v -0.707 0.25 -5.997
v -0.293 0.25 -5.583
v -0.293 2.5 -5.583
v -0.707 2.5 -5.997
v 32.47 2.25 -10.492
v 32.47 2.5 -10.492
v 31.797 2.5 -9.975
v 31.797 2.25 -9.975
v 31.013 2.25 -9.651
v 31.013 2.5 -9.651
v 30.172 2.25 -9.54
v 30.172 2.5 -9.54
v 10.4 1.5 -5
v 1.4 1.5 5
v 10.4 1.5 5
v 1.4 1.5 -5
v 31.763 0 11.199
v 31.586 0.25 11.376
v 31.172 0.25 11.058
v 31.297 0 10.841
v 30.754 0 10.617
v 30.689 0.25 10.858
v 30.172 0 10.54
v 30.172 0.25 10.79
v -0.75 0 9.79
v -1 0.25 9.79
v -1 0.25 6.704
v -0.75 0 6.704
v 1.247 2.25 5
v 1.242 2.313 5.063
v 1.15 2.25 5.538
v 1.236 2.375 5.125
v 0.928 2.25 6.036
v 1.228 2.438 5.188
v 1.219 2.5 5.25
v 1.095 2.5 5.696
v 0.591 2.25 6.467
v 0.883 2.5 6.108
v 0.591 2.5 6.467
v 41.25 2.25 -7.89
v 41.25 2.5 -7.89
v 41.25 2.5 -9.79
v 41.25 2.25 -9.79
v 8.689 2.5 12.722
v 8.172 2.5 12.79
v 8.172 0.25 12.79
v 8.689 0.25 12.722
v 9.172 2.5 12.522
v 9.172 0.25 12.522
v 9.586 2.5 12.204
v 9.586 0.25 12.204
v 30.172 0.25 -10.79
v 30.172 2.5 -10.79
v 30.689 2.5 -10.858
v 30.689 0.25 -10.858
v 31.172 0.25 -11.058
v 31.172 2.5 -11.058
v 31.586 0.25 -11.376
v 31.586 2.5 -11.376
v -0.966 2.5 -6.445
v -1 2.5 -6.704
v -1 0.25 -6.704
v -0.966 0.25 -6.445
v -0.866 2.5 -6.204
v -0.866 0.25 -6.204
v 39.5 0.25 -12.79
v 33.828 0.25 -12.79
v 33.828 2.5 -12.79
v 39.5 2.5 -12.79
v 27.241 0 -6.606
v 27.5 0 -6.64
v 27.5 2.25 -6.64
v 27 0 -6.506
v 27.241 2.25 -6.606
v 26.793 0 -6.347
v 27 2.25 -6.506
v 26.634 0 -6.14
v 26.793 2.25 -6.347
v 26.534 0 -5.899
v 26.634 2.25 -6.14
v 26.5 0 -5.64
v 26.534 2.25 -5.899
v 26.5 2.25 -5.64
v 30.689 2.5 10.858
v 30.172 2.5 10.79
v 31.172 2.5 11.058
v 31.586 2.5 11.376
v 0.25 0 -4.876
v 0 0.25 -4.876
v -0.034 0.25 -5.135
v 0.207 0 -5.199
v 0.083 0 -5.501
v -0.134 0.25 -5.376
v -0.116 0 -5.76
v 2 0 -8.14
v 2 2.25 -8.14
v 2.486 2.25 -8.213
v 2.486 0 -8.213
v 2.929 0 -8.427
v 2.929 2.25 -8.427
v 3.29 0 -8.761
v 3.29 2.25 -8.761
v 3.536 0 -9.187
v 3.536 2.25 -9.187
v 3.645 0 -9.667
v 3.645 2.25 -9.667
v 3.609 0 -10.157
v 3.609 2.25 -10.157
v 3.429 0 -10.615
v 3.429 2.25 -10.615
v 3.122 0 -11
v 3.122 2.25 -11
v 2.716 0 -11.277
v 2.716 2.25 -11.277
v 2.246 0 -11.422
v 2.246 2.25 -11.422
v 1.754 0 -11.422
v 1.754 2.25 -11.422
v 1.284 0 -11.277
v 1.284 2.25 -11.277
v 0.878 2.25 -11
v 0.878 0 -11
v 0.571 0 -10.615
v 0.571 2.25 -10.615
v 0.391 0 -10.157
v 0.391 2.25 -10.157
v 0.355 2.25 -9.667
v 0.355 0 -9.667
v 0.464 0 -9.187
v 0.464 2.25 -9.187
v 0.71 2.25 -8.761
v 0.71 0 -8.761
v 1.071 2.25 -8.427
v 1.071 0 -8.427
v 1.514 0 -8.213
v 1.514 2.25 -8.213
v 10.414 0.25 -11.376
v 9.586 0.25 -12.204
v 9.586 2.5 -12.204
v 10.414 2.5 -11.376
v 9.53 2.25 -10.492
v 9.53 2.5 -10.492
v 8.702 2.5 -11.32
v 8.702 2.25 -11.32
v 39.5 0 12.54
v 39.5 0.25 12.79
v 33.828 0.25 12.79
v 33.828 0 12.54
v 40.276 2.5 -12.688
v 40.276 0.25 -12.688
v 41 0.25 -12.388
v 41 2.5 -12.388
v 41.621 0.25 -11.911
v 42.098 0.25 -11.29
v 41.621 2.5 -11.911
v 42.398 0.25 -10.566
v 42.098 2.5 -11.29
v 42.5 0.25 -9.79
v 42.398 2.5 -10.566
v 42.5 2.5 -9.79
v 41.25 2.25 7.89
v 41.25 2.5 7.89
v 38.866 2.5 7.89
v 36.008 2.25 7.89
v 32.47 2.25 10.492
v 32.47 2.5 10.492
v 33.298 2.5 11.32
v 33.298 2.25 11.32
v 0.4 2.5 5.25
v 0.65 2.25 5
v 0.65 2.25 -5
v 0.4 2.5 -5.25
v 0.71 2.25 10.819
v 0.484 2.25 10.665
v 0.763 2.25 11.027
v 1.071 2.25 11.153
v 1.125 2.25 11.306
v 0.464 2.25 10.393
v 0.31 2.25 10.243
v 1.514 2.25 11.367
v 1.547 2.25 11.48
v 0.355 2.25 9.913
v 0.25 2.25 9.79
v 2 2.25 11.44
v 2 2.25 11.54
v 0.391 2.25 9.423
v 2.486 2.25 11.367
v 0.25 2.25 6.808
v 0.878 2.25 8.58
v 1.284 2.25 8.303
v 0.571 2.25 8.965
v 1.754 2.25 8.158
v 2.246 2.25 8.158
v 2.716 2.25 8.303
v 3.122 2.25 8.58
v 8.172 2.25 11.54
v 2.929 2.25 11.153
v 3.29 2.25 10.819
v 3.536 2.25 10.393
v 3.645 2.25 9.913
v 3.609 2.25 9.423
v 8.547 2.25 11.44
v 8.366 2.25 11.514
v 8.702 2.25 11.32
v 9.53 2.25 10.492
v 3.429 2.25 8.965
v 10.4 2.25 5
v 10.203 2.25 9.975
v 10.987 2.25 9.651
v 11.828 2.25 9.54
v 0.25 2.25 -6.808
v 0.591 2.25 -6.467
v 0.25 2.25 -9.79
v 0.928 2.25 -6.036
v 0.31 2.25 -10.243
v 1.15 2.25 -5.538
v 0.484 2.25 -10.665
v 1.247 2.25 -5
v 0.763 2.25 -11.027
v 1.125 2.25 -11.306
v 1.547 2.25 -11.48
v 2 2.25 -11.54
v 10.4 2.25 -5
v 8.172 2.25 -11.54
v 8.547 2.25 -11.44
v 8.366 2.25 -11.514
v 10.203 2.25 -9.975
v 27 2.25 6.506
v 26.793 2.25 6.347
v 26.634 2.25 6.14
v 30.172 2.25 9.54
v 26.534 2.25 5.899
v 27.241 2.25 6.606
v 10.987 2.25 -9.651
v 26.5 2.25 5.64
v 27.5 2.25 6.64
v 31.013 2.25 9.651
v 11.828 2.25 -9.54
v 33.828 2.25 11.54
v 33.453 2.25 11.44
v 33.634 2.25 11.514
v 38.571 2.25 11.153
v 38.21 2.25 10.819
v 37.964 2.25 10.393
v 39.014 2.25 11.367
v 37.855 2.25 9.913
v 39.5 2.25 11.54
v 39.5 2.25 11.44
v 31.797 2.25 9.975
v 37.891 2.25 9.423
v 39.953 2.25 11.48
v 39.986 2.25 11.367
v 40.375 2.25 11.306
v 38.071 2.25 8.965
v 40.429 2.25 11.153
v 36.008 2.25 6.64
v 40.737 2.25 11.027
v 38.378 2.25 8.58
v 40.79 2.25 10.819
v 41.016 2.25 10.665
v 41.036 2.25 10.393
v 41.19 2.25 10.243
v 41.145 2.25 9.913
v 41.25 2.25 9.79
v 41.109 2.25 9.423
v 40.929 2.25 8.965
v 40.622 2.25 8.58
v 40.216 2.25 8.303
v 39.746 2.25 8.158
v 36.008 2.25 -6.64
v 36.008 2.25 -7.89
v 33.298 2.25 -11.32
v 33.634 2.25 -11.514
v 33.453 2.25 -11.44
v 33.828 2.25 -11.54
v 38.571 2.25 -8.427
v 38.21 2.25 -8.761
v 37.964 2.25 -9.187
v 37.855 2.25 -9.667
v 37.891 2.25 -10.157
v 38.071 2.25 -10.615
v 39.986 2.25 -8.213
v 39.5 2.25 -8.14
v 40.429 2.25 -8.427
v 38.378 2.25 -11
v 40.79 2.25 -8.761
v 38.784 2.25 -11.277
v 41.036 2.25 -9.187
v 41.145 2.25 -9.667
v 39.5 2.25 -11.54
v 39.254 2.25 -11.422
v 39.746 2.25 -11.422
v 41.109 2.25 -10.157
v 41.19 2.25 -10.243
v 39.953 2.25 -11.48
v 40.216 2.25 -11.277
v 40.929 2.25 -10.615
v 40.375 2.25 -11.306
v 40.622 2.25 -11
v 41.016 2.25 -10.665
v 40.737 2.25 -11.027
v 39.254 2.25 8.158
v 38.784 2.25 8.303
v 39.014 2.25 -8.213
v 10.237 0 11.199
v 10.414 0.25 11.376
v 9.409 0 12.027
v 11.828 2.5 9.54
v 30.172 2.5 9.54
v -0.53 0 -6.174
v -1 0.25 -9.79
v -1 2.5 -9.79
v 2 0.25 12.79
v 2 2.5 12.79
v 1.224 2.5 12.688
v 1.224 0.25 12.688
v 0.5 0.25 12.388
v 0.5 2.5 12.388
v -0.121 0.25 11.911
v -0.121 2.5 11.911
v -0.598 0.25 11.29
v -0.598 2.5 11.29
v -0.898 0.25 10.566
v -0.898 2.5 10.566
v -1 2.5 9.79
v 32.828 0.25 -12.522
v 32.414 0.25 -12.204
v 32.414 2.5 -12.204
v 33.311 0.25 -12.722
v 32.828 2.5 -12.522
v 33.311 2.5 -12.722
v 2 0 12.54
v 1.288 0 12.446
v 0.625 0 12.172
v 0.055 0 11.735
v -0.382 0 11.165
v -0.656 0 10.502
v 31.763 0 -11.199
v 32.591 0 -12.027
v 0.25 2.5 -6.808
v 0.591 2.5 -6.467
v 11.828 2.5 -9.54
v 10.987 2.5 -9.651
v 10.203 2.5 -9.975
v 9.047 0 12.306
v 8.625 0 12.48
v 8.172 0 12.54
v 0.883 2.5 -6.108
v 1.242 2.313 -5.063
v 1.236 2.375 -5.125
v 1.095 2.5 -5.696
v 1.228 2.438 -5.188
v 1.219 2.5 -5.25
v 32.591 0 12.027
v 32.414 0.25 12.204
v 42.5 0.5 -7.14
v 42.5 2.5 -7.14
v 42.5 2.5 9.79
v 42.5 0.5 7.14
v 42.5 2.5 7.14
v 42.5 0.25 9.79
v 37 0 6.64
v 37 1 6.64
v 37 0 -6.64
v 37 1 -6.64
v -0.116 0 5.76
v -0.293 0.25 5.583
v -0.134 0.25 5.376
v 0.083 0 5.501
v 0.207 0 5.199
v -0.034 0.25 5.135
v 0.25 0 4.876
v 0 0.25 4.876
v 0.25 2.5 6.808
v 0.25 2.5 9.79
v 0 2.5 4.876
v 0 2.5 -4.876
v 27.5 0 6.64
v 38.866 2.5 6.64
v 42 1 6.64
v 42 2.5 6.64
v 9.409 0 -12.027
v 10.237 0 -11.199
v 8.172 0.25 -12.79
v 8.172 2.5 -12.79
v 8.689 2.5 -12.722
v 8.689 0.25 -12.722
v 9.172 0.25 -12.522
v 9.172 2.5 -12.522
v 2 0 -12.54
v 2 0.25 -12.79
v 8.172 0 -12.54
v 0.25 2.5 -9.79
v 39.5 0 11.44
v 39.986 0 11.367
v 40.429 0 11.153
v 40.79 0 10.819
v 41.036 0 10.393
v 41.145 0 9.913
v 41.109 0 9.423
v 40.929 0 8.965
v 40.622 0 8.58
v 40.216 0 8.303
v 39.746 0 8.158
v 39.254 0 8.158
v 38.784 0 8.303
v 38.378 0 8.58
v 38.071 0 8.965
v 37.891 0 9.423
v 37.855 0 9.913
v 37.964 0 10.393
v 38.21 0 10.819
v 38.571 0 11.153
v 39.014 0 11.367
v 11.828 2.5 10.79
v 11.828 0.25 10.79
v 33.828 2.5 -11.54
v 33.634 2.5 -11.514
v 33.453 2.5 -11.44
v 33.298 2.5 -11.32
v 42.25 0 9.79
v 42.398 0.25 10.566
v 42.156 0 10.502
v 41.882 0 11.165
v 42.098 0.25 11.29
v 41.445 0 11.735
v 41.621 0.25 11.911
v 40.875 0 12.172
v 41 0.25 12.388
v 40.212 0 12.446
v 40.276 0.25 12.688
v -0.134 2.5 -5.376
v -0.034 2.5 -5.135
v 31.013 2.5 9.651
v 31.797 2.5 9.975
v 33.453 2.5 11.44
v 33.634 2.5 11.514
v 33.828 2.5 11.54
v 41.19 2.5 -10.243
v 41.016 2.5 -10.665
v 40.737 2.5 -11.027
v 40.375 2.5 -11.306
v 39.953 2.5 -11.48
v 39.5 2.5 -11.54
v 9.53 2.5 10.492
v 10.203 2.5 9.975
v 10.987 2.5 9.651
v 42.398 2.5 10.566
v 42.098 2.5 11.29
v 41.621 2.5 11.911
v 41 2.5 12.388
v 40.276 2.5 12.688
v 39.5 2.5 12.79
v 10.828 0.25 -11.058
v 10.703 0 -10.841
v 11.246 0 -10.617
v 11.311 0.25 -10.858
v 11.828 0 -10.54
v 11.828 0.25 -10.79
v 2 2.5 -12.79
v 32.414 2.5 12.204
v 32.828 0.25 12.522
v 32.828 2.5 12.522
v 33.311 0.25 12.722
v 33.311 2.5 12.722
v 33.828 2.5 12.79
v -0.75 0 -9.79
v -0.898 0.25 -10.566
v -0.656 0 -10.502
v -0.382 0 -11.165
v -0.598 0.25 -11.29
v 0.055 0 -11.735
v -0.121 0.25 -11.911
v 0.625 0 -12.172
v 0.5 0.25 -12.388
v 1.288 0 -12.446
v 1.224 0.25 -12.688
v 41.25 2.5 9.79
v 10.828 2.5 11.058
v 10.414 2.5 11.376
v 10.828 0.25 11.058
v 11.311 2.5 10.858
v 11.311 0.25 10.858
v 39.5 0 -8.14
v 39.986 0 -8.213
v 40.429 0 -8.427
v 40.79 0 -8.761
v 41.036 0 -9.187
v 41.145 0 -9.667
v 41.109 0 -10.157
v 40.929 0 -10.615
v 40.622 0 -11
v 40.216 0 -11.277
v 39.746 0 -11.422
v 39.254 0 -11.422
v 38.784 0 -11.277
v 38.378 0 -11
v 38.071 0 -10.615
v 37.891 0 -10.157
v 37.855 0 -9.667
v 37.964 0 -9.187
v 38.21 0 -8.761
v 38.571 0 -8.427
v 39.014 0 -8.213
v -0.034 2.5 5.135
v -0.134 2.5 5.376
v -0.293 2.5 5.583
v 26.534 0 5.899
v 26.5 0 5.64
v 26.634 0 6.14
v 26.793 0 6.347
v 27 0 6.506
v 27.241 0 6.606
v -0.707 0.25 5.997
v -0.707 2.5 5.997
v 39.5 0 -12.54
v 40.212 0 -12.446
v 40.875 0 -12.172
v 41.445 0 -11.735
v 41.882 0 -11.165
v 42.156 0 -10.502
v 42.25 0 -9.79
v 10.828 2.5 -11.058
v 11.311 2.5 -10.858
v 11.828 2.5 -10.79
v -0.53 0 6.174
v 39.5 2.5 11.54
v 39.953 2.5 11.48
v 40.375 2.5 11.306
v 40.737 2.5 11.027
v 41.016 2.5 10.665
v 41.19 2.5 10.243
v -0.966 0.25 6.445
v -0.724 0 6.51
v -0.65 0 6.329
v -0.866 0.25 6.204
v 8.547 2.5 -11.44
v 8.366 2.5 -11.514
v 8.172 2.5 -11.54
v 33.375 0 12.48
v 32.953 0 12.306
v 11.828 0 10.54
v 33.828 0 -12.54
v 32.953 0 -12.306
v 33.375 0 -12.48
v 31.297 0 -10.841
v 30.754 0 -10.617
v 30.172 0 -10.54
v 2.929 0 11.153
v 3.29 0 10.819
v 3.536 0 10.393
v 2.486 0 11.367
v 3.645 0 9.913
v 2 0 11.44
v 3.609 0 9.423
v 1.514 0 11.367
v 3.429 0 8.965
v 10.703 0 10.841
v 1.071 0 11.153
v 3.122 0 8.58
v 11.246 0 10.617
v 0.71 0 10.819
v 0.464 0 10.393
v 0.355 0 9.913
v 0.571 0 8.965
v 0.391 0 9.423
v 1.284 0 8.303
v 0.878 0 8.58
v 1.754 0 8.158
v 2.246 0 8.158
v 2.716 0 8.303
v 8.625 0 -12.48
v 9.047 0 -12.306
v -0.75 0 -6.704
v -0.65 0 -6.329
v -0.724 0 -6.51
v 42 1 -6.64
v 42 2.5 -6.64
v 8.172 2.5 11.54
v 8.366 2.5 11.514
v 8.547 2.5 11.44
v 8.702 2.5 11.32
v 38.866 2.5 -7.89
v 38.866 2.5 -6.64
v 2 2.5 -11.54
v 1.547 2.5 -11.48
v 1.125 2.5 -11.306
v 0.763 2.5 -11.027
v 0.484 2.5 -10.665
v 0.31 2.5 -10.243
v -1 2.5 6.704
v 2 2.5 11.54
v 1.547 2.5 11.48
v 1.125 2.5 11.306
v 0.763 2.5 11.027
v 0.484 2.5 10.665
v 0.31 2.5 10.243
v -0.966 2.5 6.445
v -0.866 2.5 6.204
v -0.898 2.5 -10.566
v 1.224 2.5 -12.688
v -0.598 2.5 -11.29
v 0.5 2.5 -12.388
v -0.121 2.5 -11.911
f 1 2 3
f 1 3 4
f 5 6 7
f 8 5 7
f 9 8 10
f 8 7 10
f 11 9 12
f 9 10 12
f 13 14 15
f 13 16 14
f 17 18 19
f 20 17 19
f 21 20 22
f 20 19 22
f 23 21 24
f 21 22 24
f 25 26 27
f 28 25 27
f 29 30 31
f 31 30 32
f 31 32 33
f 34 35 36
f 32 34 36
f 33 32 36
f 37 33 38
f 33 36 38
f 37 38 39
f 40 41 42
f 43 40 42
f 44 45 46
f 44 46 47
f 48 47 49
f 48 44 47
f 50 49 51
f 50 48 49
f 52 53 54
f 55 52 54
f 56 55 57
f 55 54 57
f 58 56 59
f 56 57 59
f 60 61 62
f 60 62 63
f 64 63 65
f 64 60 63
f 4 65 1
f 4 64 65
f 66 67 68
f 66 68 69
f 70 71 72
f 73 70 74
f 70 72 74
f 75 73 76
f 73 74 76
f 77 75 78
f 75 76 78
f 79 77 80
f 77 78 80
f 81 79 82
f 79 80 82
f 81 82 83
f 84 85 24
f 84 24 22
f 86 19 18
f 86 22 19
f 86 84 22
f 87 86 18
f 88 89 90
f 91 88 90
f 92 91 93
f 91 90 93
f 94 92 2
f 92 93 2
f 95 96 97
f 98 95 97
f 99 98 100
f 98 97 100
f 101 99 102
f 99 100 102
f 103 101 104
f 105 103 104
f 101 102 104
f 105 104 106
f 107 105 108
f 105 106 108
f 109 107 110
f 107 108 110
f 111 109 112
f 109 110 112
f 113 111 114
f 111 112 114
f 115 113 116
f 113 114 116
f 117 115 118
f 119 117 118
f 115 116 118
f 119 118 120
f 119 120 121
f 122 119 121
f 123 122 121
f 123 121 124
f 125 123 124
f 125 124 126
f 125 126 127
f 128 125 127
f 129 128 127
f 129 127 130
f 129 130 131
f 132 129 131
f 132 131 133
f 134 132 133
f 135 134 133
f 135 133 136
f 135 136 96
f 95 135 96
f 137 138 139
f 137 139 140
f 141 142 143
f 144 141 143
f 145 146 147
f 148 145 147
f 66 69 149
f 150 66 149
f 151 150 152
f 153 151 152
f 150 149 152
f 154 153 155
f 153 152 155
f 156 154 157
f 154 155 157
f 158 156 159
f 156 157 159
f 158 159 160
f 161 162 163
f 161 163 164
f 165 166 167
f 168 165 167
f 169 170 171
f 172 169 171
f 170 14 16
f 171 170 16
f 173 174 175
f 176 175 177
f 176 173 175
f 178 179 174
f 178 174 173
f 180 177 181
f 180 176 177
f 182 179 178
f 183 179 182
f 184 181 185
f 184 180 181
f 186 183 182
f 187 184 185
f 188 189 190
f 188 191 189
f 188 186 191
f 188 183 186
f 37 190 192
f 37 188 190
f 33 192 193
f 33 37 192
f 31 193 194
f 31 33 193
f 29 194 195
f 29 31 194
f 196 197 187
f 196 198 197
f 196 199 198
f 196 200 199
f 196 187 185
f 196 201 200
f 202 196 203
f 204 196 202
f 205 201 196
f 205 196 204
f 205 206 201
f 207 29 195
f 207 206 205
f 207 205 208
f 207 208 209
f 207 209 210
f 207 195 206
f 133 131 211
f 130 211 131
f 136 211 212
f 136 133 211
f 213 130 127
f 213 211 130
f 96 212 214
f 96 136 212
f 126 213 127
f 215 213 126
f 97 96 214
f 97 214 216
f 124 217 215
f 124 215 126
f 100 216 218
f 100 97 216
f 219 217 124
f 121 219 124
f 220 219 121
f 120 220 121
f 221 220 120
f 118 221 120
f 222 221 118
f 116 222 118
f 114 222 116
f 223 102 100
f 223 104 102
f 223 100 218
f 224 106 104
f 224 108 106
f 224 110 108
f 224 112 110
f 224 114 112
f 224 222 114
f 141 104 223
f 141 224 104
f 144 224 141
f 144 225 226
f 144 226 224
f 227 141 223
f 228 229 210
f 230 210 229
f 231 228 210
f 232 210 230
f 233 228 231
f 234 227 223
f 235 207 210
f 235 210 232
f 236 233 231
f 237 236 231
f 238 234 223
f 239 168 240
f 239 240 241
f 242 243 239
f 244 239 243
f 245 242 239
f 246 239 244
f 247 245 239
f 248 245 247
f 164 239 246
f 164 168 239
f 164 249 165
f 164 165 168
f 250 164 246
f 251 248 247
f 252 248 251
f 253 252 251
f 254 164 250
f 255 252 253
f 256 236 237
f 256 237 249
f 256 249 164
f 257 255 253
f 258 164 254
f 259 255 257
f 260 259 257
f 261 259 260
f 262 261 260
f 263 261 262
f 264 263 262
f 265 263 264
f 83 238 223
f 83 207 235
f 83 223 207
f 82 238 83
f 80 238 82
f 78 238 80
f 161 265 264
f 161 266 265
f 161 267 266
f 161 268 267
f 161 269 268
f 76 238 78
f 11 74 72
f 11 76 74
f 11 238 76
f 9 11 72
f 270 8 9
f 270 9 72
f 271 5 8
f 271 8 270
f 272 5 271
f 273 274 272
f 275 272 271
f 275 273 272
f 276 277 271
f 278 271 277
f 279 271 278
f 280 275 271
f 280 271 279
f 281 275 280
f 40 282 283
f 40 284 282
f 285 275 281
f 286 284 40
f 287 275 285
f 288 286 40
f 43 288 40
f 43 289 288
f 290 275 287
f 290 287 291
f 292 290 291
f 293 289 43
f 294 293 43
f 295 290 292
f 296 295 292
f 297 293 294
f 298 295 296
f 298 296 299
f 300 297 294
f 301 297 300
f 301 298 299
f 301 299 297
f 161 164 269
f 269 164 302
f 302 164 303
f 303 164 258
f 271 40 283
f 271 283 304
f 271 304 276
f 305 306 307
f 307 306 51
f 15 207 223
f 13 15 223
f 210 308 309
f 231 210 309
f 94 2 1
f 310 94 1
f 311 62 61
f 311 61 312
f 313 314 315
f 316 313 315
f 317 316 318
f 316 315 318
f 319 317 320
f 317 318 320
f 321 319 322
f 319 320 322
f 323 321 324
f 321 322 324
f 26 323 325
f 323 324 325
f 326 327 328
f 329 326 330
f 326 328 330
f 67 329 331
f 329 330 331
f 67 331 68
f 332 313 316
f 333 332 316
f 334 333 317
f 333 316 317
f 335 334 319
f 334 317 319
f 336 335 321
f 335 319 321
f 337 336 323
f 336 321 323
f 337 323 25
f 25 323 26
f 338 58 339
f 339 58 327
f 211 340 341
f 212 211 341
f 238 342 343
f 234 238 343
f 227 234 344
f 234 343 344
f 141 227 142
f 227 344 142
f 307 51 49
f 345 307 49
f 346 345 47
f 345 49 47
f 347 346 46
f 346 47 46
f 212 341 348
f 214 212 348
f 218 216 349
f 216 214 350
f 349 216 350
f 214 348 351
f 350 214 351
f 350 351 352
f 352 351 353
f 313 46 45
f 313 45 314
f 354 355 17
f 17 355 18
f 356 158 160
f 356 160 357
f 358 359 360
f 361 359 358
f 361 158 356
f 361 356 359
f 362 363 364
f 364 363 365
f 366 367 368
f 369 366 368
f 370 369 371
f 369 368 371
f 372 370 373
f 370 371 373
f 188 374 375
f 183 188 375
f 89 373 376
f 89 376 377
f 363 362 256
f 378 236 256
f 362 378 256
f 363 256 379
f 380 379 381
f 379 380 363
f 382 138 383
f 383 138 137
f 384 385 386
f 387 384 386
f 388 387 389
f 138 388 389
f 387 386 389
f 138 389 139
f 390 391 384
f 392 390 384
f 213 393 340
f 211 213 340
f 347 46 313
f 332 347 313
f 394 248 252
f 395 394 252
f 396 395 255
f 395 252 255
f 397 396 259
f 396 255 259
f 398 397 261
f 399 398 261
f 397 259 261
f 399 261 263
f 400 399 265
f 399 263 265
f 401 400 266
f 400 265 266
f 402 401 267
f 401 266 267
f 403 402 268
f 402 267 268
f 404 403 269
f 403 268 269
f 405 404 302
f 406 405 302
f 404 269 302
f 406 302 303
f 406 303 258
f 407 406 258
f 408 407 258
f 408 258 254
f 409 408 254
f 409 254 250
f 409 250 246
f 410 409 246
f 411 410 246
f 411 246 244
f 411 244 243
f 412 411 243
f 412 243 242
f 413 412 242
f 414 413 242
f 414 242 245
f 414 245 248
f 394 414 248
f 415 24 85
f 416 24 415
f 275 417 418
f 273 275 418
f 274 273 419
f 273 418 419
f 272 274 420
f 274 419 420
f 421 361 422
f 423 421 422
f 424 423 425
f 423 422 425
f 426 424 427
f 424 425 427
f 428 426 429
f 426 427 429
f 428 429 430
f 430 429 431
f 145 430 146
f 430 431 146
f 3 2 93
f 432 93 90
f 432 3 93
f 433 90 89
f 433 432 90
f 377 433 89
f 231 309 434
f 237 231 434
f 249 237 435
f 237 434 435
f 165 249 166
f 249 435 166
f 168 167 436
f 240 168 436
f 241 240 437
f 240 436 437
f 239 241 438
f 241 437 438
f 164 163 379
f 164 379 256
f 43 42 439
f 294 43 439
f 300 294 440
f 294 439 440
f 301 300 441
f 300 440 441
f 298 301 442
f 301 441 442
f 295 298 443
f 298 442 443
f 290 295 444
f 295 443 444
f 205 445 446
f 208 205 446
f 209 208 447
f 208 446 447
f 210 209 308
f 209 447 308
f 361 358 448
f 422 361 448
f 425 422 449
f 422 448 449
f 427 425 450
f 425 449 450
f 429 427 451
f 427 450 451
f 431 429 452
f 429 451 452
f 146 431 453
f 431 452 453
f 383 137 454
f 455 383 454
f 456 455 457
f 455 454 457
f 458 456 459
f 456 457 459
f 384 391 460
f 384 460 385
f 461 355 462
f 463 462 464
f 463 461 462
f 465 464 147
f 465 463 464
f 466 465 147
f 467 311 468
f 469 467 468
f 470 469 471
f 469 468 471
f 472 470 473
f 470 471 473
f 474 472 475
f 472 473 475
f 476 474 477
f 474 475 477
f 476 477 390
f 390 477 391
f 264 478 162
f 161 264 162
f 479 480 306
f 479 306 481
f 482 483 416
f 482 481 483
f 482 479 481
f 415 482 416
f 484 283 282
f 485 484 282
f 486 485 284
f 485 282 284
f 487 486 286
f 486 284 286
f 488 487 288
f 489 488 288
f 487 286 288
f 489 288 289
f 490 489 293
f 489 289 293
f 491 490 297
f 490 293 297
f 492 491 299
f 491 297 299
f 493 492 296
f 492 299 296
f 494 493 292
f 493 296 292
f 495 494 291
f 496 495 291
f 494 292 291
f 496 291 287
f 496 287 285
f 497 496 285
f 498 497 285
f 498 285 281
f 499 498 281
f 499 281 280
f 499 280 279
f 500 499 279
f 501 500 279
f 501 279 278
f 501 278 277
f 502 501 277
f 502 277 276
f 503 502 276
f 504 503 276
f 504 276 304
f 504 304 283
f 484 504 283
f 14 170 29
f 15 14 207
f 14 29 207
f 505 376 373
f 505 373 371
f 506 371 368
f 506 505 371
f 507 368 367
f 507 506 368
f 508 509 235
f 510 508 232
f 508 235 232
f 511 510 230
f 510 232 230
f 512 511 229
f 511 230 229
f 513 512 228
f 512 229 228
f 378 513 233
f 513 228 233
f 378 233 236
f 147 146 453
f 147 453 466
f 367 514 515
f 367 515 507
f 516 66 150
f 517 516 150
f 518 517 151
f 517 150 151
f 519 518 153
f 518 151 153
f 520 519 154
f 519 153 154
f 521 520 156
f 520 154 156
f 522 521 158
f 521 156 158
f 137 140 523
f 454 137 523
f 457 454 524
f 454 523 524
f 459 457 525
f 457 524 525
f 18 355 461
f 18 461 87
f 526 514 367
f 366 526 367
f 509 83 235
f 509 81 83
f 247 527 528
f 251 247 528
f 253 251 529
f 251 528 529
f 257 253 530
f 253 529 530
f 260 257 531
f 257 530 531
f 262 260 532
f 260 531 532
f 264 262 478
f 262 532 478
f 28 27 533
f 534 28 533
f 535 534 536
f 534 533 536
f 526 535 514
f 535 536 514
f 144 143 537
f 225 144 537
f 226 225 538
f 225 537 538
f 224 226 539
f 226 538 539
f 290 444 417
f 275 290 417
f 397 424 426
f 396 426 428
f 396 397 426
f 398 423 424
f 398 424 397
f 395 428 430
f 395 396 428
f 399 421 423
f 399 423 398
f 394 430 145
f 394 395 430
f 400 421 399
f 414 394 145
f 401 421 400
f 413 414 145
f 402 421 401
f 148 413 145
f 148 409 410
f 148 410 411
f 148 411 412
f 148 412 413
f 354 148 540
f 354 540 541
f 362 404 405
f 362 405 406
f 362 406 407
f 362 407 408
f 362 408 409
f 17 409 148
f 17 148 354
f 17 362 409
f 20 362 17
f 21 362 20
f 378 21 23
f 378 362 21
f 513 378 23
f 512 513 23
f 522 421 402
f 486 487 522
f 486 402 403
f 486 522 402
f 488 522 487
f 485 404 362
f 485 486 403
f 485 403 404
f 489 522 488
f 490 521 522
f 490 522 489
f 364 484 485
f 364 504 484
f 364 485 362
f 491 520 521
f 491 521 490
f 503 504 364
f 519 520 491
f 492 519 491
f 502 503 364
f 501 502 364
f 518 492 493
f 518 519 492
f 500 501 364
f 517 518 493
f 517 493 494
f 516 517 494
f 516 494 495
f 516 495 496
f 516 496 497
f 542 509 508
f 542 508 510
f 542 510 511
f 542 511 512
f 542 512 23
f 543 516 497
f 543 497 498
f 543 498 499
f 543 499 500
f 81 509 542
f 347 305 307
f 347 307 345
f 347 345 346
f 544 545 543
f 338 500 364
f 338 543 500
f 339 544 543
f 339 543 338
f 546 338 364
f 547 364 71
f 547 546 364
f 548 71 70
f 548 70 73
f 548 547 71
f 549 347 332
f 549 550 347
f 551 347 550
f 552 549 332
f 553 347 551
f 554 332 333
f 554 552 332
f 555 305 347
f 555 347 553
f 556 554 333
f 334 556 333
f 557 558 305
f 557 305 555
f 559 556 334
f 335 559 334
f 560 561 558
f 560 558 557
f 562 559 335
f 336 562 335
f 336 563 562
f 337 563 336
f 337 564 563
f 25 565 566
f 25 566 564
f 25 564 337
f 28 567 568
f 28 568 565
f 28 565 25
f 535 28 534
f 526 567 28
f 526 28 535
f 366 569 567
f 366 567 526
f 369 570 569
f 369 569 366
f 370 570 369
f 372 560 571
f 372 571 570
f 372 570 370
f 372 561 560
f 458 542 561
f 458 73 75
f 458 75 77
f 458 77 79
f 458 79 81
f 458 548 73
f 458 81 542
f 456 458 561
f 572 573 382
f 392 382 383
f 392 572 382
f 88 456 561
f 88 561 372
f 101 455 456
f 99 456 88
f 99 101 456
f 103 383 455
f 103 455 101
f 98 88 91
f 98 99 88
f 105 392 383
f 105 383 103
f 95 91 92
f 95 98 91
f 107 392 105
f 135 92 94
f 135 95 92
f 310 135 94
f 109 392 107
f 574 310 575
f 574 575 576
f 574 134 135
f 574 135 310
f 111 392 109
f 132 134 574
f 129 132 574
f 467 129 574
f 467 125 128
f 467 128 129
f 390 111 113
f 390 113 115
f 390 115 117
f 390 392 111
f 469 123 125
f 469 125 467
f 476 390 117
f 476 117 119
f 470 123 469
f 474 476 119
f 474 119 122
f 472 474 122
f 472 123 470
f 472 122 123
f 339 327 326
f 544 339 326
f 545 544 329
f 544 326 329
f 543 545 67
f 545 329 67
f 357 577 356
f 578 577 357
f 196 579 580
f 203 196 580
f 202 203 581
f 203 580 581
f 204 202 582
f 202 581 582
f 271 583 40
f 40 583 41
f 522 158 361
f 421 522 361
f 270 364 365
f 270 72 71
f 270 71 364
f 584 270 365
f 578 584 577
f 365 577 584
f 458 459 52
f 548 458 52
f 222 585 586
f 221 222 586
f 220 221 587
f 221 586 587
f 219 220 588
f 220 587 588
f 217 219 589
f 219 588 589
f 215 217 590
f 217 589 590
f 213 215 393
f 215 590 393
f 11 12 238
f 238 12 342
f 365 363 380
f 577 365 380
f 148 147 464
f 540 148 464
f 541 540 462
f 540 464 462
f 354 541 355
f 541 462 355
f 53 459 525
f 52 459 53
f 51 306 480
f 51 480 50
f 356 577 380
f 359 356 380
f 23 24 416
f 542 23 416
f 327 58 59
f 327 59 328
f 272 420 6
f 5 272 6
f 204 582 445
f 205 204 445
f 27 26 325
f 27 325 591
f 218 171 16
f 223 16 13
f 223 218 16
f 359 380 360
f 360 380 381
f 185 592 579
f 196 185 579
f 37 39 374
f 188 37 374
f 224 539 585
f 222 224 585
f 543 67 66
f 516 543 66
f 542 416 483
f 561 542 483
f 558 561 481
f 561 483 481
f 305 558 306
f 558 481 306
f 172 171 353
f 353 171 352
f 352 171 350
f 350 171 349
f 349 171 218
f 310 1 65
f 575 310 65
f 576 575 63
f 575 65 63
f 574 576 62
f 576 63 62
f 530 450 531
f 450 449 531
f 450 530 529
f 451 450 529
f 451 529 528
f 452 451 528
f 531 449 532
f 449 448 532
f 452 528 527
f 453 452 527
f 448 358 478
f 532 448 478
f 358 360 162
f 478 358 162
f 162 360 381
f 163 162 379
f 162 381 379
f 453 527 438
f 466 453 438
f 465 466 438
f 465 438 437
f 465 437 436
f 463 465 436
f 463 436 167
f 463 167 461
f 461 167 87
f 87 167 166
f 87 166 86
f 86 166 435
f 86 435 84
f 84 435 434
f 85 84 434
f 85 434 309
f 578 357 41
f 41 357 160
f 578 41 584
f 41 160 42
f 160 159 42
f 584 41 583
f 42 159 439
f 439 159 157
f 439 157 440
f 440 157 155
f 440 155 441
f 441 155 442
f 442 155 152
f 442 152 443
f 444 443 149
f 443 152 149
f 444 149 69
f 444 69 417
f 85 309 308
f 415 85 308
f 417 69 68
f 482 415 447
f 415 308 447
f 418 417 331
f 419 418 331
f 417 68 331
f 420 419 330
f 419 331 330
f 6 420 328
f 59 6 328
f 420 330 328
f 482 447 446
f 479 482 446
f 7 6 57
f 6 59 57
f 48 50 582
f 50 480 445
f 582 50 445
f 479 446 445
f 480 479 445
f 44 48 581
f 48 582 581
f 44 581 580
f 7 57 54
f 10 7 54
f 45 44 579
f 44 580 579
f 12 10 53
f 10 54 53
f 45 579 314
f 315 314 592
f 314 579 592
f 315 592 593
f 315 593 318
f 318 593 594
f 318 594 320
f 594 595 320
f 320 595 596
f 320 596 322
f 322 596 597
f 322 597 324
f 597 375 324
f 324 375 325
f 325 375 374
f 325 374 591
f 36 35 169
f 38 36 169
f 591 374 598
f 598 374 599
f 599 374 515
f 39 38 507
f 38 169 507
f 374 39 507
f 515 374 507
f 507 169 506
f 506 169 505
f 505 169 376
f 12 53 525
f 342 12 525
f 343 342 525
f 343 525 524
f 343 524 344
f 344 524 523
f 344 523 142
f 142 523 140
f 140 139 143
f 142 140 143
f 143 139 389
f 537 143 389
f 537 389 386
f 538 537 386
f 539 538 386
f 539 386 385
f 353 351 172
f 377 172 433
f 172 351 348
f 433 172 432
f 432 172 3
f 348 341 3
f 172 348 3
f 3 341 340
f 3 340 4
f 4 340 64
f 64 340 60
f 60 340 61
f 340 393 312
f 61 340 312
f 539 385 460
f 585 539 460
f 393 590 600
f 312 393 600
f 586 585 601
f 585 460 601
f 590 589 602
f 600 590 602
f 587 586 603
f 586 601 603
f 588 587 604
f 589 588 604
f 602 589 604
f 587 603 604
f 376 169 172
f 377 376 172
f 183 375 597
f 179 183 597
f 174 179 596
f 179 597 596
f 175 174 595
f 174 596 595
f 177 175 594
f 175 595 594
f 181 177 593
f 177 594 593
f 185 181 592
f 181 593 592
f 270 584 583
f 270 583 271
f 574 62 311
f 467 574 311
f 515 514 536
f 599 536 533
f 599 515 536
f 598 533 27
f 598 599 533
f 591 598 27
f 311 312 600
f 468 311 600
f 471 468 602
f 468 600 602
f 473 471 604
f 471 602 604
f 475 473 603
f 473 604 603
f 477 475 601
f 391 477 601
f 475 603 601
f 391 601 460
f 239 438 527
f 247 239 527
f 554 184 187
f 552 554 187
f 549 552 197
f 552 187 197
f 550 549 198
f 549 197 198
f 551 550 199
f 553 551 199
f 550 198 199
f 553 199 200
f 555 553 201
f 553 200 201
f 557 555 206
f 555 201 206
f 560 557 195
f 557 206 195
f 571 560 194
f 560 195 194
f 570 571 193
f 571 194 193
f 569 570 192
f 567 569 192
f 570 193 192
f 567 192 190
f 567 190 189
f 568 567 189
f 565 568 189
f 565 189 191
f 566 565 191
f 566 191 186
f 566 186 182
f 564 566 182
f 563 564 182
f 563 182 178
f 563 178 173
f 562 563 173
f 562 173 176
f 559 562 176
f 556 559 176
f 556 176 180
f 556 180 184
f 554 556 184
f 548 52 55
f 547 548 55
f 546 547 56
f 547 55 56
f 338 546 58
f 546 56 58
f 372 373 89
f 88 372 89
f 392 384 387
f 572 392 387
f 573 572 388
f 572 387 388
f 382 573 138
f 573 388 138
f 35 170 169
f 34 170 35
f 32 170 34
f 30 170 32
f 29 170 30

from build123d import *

# Parameters (mm, degrees)
BOSS_EXTRUDE1_DEPTH = 2.5
FILLET1_R           = 3
FILLET2_R           = 1
FILLET3_R           = 2
SKETCH3_W           = 16.773949538
SKETCH3_H           = 15.481085324
BOSS_EXTRUDE2_DEPTH = 1
CHAMFER1_SIZE       = 0.5
SKETCH5_R           = 1.65
CUT_EXTRUDE3_DEPTH  = 45.453167491
SKETCH6_W           = 10
SKETCH6_H           = 10
CUT_EXTRUDE4_DEPTH  = 1
CHAMFER2_SIZE       = 0.25
CHAMFER3_SIZE       = 0.25
SKETCH7_W           = 4
SKETCH7_H           = 13.28
CUT_EXTRUDE5_DEPTH  = 45.408153531
CHAMFER4_SIZE       = 1
CUT_EXTRUDE6_DEPTH  = 0.25
CUT_EXTRUDE8_DEPTH  = 10
SKETCH11_W          = 19.67193657
SKETCH11_H          = 16.670050146
CUT_EXTRUDE9_DEPTH  = 0.25
CHAMFER5_SIZE       = 3
CHAMFER5_SIZE_2     = 0.262465991


# Some blends are built 0.0001 mm under size
with BuildPart() as part:
    # Sketch1 → Boss-Extrude1 (new body)
    with BuildSketch(Plane(origin=(0, 0, 0), x_dir=(1, 0, 0), z_dir=(0, 1, 0))):
        Polygon((0, -5.29), (0, 5.29), (-1, 6.29), (-1, 12.79), (9, 12.79), (11, 10.79), (31, 10.79), (33, 12.79), (42.5, 12.79), (42.5, 6.64), (26.5, 6.64), (26.5, -6.64), (42.5, -6.64), (42.5, -12.79), (33, -12.79), (31, -10.79), (11, -10.79), (9, -12.79), (-1, -12.79), (-1, -6.29), align=None)
    extrude(amount=BOSS_EXTRUDE1_DEPTH)

    # Fillet1
    fillet1_edges = [part.edges().sort_by_distance(p)[0] for p in [
        (-1, 1.25, -12.79),
        (42.5, 1.25, -12.79),
        (42.5, 1.25, 12.79),
        (-1, 1.25, 12.79),
    ]]
    fillet(fillet1_edges, radius=FILLET1_R)

    # Fillet2
    fillet2_edges = [part.edges().sort_by_distance(p)[0] for p in [
        (-1, 1.25, -6.29),
        (26.5, 1.25, -6.64),
        (26.5, 1.25, 6.64),
        (-1, 1.25, 6.29),
        (0, 1.25, 5.29),
        (0, 1.25, -5.29),
    ]]
    fillet(fillet2_edges, radius=FILLET2_R)

    # Fillet3
    fillet3_edges = [part.edges().sort_by_distance(p)[0] for p in [
        (9, 1.25, -12.79),
        (11, 1.25, -10.79),
        (31, 1.25, -10.79),
        (33, 1.25, -12.79),
        (33, 1.25, 12.79),
        (31, 1.25, 10.79),
        (11, 1.25, 10.79),
        (9, 1.25, 12.79),
    ]]
    fillet(fillet3_edges, radius=FILLET3_R)

    # Sketch3 → Boss-Extrude2 (add)
    with BuildSketch(Plane.XZ):
        with Locations((34.113025231, 0.175921424)):
            Rectangle(SKETCH3_W, SKETCH3_H)
    extrude(amount=-BOSS_EXTRUDE2_DEPTH)

    # Chamfer1
    chamfer1_edges = [part.edges().sort_by_distance(p)[0] for p in [
        (42.5, 1, 0),
        (42.5, 1.75, -6.64),
        (42.5, 1.75, 6.64),
    ]]
    chamfer(chamfer1_edges, length=CHAMFER1_SIZE)

    # Sketch5 → Cut-Extrude3 (cut, through all)
    with BuildSketch(Plane(origin=(0, 2.5, 0), x_dir=(1, 0, 0), z_dir=(0, 1, 0))):
        with Locations(Location((2, 9.79, 0), (0, 0, 270))):
            Circle(SKETCH5_R)
        with Locations(Location((2, -9.79, 0), (0, 0, 270))):
            Circle(SKETCH5_R)
        with Locations(Location((39.5, 9.79, 0), (0, 0, 270))):
            Circle(SKETCH5_R)
        with Locations(Location((39.5, -9.79, 0), (0, 0, 270))):
            Circle(SKETCH5_R)
    extrude(amount=-CUT_EXTRUDE3_DEPTH, mode=Mode.SUBTRACT)

    # Sketch6 → Cut-Extrude4 (cut)
    with BuildSketch(Plane(origin=(0, 2.5, 0), x_dir=(1, 0, 0), z_dir=(0, 1, 0))):
        with Locations((5.4, 0)):
            Rectangle(SKETCH6_W, SKETCH6_H)
    extrude(amount=-CUT_EXTRUDE4_DEPTH, mode=Mode.SUBTRACT)

    # Chamfer2
    chamfer2_edges = [part.edges().sort_by_distance(p)[0] for p in [
        (10.4, 2.5, 0),
        (5.4, 2.5, -5),
        (5.4, 2.5, 5),
    ]]
    chamfer(chamfer2_edges, length=CHAMFER2_SIZE)

    # Chamfer3
    chamfer3_edges = [part.edges().sort_by_distance(p)[0] for p in [
        (36.664213562, 0, 12.79),
        (5.085786438, 0, -12.79),
        (10, 0, -11.79),
        (21, 0, -10.79),
        (32, 0, -11.79),
        (32, 0, 11.79),
        (21, 0, 10.79),
        (10, 0, 11.79),
        (8.93693974, 0, -12.637759065),
        (33.06306026, 0, -12.637759065),
        (8.93693974, 0, 12.637759065),
        (33.06306026, 0, 12.637759065),
        (30.93693974, 0, 10.942240935),
        (11.06306026, 0, 10.942240935),
        (30.93693974, 0, -10.942240935),
        (11.06306026, 0, -10.942240935),
        (42.5, 0, 0),
        (-1, 0, -8.247106781),
        (36.664213562, 0, -12.79),
        (5.085786438, 0, 12.79),
        (-0.121320344, 0, 11.911320344),
        (41.621320344, 0, 11.911320344),
        (41.621320344, 0, -11.911320344),
        (-0.121320344, 0, -11.911320344),
        (-1, 0, 8.247106781),
        (-0.5, 0, 5.79),
        (0, 0, 0),
        (-0.5, 0, -5.79),
        (-0.923879533, 0, -6.32153013),
        (-0.923879533, 0, 6.32153013),
        (-0.076120467, 0, 5.25846987),
        (-0.076120467, 0, -5.25846987),
    ]]
    chamfer(chamfer3_edges, length=CHAMFER3_SIZE)

    # Sketch7 → Cut-Extrude5 (cut, through all)
    with BuildSketch(Plane(origin=(0, 1, 0), x_dir=(1, 0, 0), z_dir=(0, 1, 0))):
        with Locations((35, 0)):
            Rectangle(SKETCH7_W, SKETCH7_H)
    extrude(amount=-CUT_EXTRUDE5_DEPTH, mode=Mode.SUBTRACT)

    # Chamfer4
    chamfer4_edges = [part.edges().sort_by_distance(p)[0] for p in [
        (0.4, 1.5, 0),
    ]]
    chamfer(chamfer4_edges, length=CHAMFER4_SIZE - 0.0001)  # a hair under: the kernel refuses the full size

    # Sketch8 → Cut-Extrude6 (cut)
    with BuildSketch(Plane(origin=(0, 2.5, 0), x_dir=(1, 0, 0), z_dir=(0, 1, 0))):
        with BuildLine():
            Line((41.25, -9.79), (41.25, -7.89))
            Line((41.25, -7.89), (27.5, -7.89))
            ThreePointArc((27.5, -7.89), (25.909009742, -7.230990258), (25.25, -5.64))
            Line((25.25, -5.64), (25.25, 5.64))
            ThreePointArc((25.25, 5.64), (25.909009742, 7.230990258), (27.5, 7.89))
            Line((27.5, 7.89), (41.25, 7.89))
            Line((41.25, 7.89), (41.25, 9.79))
            ThreePointArc((41.25, 9.79), (40.737436867, 11.027436867), (39.5, 11.54))
            Line((39.5, 11.54), (33.828427125, 11.54))
            ThreePointArc((33.828427125, 11.54), (33.54141455, 11.482909649), (33.298097039, 11.320330086))
            Line((33.298097039, 11.320330086), (32.469669914, 10.491902961))
            ThreePointArc((32.469669914, 10.491902961), (31.41529403, 9.787391519), (30.171572875, 9.54))
            Line((30.171572875, 9.54), (11.828427125, 9.54))
            ThreePointArc((11.828427125, 9.54), (10.58470597, 9.787391519), (9.530330086, 10.491902961))
            Line((9.530330086, 10.491902961), (8.701902961, 11.320330086))
            ThreePointArc((8.701902961, 11.320330086), (8.45858545, 11.482909649), (8.171572875, 11.54))
            Line((8.171572875, 11.54), (2, 11.54))
            ThreePointArc((2, 11.54), (0.762563133, 11.027436867), (0.25, 9.79))
            Line((0.25, 9.79), (0.25, 6.807766953))
            Line((0.25, 6.807766953), (0.590990258, 6.466776695))
            ThreePointArc((0.590990258, 6.466776695), (1.078728948, 5.73682416), (1.25, 4.875786438))
            Line((1.25, 4.875786438), (1.25, -4.875786438))
            ThreePointArc((1.25, -4.875786438), (1.078728948, -5.73682416), (0.590990258, -6.466776695))
            Line((0.590990258, -6.466776695), (0.25, -6.807766953))
            Line((0.25, -6.807766953), (0.25, -9.79))
            ThreePointArc((0.25, -9.79), (0.762563133, -11.027436867), (2, -11.54))
            Line((2, -11.54), (8.171572875, -11.54))
            ThreePointArc((8.171572875, -11.54), (8.45858545, -11.482909649), (8.701902961, -11.320330086))
            Line((8.701902961, -11.320330086), (9.530330086, -10.491902961))
            ThreePointArc((9.530330086, -10.491902961), (10.58470597, -9.787391519), (11.828427125, -9.54))
            Line((11.828427125, -9.54), (30.171572875, -9.54))
            ThreePointArc((30.171572875, -9.54), (31.41529403, -9.787391519), (32.469669914, -10.491902961))
            Line((32.469669914, -10.491902961), (33.298097039, -11.320330086))
            ThreePointArc((33.298097039, -11.320330086), (33.54141455, -11.482909649), (33.828427125, -11.54))
            Line((33.828427125, -11.54), (39.5, -11.54))
            ThreePointArc((39.5, -11.54), (40.737436867, -11.027436867), (41.25, -9.79))
        make_face()
    extrude(amount=-CUT_EXTRUDE6_DEPTH, mode=Mode.SUBTRACT)

    # Sketch10 → Cut-Extrude8 (cut)
    with BuildSketch(Plane(origin=(0, 1, 0), x_dir=(1, 0, 0), z_dir=(0, 1, 0))):
        with BuildLine():
            Line((27.5, -6.64), (33, -6.64))
            Line((33, -6.64), (33, 6.64))
            Line((33, 6.64), (27.5, 6.64))
            ThreePointArc((27.5, 6.64), (26.792893219, 6.347106781), (26.5, 5.64))
            Line((26.5, 5.64), (26.5, -5.64))
            ThreePointArc((26.5, -5.64), (26.792893219, -6.347106781), (27.5, -6.64))
        make_face()
    extrude(amount=-CUT_EXTRUDE8_DEPTH, mode=Mode.SUBTRACT)

    # Sketch11 → Cut-Extrude9 (cut)
    with BuildSketch(Plane(origin=(0, 2.5, 0), x_dir=(1, 0, 0), z_dir=(0, 1, 0))):
        with Locations((26.029913711, 0)):
            Rectangle(SKETCH11_W, SKETCH11_H)
    extrude(amount=-CUT_EXTRUDE9_DEPTH, mode=Mode.SUBTRACT)

    # Chamfer5
    # the kernel refuses this chamfer: 3, 0.262465991 mm, written as the material it takes off along each edge
    with BuildSketch(Plane(origin=(35.865881996, 2.5, 15.68890224), x_dir=(0.9999943799678764, 0.0033526157940331697, 0), z_dir=(0, 0, -1))) as chamfer5_piece_1_section:
        Polygon((CHAMFER5_SIZE * 0.999994379968, CHAMFER5_SIZE * 0.00335261579403), (-CHAMFER5_SIZE_2 * 0.00335261578864, CHAMFER5_SIZE_2 * 0.999994378359), (0, 0), align=None)
    chamfer5_piece_1 = extrude(amount=16.847804479, mode=Mode.PRIVATE)
    chamfer5_piece_1 = split(chamfer5_piece_1, bisect_by=Plane(origin=(36.868035548, 2.25, 7.265), z_dir=(0, 1, 0)), keep=Keep.TOP, mode=Mode.PRIVATE)
    chamfer5_piece_1 = split(chamfer5_piece_1, bisect_by=Plane(origin=(36.868035548, 2.412888159, 11.54), z_dir=(0, 0, -1)), keep=Keep.TOP, mode=Mode.PRIVATE)
    add(chamfer5_piece_1, mode=Mode.SUBTRACT)
    with BuildSketch(Plane(origin=(35.865881996, 2.5, 1.15890224), x_dir=(0.9999943799678764, 0.0033526157940331697, 0), z_dir=(0, 0, -1))) as chamfer5_piece_2_section:
        Polygon((CHAMFER5_SIZE * 0.999994379968, CHAMFER5_SIZE * 0.00335261579403), (-CHAMFER5_SIZE_2 * 0.00335261578864, CHAMFER5_SIZE_2 * 0.999994378359), (0, 0), align=None)
    chamfer5_piece_2 = extrude(amount=9.04890224, mode=Mode.PRIVATE)
    chamfer5_piece_2 = split(chamfer5_piece_2, bisect_by=Plane(origin=(36.868035548, 2.25, -7.265), z_dir=(0, 1, 0)), keep=Keep.TOP, mode=Mode.PRIVATE)
    add(chamfer5_piece_2, mode=Mode.SUBTRACT)


solid = part.part
